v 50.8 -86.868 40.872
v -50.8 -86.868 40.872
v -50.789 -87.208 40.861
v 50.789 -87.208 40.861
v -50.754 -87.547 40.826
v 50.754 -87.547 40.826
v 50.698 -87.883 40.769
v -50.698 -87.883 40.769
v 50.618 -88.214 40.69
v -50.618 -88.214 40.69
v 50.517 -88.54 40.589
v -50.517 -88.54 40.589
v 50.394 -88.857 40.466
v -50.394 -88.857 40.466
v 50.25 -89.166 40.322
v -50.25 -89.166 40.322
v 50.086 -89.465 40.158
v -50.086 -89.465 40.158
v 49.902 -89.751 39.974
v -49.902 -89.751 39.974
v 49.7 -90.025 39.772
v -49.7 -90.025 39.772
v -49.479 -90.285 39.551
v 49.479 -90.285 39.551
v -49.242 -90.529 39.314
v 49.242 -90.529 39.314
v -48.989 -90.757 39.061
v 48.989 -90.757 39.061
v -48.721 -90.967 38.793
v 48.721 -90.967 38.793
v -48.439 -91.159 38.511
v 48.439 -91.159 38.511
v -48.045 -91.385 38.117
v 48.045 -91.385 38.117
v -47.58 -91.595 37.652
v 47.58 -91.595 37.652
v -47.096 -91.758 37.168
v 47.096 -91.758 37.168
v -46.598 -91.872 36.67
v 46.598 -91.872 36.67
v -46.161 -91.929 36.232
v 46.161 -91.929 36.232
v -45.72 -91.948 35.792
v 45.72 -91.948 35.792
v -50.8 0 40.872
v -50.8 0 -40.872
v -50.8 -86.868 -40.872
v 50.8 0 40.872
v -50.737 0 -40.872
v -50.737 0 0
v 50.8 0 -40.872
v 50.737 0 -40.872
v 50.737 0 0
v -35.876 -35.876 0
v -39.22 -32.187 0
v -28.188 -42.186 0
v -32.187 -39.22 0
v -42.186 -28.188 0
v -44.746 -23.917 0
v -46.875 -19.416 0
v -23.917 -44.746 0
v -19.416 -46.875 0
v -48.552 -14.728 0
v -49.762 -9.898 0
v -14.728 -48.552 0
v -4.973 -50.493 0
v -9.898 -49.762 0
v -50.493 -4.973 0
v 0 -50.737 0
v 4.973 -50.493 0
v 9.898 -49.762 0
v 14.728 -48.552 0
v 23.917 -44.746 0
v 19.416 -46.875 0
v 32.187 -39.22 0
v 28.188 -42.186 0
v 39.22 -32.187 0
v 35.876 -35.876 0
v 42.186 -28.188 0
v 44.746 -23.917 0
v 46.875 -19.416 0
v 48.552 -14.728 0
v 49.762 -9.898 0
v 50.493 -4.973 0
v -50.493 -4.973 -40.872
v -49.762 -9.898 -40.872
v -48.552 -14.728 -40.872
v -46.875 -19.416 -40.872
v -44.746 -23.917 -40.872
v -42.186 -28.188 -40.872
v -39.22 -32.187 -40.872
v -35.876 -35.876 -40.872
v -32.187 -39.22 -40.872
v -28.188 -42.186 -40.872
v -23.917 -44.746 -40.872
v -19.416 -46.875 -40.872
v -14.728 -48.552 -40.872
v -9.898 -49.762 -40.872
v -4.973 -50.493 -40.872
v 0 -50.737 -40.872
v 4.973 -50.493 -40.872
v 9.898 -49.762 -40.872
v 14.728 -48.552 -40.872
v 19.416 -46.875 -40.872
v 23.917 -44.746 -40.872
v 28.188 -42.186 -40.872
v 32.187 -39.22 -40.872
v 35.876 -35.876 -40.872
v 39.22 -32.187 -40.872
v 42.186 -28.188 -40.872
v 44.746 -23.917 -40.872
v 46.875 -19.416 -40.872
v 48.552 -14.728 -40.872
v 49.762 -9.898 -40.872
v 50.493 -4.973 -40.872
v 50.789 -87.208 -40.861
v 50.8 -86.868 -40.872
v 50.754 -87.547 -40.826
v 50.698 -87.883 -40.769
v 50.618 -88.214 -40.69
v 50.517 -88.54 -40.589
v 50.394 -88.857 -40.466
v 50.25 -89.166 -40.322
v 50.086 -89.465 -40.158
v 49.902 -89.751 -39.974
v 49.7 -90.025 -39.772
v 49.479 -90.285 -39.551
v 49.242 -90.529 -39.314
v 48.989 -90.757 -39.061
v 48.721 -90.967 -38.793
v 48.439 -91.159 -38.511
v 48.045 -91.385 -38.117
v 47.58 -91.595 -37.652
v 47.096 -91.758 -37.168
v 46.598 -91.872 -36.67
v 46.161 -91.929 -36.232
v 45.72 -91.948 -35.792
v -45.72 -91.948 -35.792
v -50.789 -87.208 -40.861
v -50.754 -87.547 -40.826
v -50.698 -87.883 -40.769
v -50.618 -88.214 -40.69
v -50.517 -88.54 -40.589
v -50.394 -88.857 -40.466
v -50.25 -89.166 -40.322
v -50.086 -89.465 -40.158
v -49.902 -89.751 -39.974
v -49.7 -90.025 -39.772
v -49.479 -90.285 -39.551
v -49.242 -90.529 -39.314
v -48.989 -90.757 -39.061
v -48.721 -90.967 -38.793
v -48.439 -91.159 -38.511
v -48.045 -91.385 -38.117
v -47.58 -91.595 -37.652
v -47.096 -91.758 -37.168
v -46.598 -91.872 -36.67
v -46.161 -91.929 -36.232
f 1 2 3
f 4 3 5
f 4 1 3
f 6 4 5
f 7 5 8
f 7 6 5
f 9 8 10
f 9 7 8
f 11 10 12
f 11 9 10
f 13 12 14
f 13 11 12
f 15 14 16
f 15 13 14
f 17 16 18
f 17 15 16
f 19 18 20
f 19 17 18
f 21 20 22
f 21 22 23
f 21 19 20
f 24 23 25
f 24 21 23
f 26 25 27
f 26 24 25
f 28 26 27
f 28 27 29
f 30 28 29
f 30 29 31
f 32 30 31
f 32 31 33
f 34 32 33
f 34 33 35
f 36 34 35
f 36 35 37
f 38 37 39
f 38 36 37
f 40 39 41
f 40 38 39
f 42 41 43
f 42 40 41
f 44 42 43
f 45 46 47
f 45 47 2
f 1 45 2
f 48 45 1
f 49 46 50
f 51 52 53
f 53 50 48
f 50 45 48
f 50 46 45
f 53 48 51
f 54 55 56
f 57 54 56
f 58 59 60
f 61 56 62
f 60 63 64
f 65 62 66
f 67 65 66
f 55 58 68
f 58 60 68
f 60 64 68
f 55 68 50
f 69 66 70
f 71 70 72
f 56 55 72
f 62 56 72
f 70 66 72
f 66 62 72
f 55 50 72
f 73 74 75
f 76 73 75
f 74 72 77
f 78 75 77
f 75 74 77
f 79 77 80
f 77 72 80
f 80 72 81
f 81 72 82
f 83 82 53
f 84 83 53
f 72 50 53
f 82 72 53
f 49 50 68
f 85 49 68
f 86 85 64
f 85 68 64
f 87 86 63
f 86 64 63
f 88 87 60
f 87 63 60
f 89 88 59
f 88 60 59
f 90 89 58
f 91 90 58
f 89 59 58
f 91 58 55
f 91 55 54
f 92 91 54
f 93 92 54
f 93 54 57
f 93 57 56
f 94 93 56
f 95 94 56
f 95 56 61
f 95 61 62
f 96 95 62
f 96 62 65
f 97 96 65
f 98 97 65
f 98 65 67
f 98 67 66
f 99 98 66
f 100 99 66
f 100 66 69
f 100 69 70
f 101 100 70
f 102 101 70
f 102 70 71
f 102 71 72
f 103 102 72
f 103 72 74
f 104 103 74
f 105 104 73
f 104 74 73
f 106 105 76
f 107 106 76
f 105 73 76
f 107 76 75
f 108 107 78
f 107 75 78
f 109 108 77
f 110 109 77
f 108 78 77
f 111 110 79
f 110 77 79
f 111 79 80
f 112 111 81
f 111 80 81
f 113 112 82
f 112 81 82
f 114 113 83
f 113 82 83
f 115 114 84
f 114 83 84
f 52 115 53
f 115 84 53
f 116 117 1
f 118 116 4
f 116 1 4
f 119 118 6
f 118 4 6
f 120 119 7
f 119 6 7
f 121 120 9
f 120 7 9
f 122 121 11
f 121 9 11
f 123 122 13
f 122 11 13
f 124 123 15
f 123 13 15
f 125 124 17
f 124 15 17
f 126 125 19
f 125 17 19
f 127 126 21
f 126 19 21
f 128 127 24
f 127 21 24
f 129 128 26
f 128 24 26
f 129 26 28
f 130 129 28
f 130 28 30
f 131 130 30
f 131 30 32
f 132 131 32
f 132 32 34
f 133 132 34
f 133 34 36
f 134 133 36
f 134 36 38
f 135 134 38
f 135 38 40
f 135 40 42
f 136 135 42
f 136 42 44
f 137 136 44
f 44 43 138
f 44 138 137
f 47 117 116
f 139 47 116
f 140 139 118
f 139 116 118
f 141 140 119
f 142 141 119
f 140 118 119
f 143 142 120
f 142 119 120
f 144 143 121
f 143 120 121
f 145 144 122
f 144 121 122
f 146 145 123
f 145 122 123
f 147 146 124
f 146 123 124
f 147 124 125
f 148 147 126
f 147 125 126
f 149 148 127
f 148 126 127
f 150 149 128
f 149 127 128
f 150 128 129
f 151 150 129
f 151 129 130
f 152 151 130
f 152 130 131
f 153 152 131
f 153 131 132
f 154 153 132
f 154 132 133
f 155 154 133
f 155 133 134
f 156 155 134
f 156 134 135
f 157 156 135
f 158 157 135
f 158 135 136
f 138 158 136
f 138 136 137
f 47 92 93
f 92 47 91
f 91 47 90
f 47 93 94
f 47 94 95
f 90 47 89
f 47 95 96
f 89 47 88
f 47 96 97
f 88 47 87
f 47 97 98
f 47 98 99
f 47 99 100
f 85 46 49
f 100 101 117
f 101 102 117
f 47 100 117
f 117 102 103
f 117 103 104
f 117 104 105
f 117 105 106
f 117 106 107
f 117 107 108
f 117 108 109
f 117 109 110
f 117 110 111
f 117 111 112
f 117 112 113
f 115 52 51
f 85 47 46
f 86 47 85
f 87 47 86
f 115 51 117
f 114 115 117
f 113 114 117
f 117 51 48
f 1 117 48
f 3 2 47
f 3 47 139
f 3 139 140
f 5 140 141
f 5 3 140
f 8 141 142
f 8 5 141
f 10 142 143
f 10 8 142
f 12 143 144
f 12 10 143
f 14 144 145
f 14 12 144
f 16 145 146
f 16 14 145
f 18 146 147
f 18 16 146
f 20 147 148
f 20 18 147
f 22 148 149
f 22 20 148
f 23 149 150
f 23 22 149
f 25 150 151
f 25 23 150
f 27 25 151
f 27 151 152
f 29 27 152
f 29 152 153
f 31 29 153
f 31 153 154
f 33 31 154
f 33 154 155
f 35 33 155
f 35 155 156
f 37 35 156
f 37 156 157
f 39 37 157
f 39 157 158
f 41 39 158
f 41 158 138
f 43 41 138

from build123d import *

# Parameters (mm, degrees)
F0_W     = 101.6
F0_H     = 81.743848
F1_DEPTH = 91.948
F2_R     = 5.08
F3_R     = 50.736946
F4_DEPTH = 40.872924


with BuildPart() as f1:
    # F0 (on Front) → F1 (new body)
    with BuildSketch(Plane.XZ):
        Rectangle(F0_W, F0_H)
    extrude(amount=F1_DEPTH)

    # F2
    f2_edges = [f1.edges().sort_by_distance(p)[0] for p in [
        (-50.8, -91.948, 0),
        (0, -91.948, -40.871924),
        (50.8, -91.948, 0),
        (0, -91.948, 40.871924),
    ]]
    fillet(f2_edges, radius=F2_R)

    # F3 (on Top) → F4 (cut, through all)
    with BuildSketch(Plane.XY):
        Circle(F3_R)
    extrude(amount=-F4_DEPTH, mode=Mode.SUBTRACT)


solid = f1.part
